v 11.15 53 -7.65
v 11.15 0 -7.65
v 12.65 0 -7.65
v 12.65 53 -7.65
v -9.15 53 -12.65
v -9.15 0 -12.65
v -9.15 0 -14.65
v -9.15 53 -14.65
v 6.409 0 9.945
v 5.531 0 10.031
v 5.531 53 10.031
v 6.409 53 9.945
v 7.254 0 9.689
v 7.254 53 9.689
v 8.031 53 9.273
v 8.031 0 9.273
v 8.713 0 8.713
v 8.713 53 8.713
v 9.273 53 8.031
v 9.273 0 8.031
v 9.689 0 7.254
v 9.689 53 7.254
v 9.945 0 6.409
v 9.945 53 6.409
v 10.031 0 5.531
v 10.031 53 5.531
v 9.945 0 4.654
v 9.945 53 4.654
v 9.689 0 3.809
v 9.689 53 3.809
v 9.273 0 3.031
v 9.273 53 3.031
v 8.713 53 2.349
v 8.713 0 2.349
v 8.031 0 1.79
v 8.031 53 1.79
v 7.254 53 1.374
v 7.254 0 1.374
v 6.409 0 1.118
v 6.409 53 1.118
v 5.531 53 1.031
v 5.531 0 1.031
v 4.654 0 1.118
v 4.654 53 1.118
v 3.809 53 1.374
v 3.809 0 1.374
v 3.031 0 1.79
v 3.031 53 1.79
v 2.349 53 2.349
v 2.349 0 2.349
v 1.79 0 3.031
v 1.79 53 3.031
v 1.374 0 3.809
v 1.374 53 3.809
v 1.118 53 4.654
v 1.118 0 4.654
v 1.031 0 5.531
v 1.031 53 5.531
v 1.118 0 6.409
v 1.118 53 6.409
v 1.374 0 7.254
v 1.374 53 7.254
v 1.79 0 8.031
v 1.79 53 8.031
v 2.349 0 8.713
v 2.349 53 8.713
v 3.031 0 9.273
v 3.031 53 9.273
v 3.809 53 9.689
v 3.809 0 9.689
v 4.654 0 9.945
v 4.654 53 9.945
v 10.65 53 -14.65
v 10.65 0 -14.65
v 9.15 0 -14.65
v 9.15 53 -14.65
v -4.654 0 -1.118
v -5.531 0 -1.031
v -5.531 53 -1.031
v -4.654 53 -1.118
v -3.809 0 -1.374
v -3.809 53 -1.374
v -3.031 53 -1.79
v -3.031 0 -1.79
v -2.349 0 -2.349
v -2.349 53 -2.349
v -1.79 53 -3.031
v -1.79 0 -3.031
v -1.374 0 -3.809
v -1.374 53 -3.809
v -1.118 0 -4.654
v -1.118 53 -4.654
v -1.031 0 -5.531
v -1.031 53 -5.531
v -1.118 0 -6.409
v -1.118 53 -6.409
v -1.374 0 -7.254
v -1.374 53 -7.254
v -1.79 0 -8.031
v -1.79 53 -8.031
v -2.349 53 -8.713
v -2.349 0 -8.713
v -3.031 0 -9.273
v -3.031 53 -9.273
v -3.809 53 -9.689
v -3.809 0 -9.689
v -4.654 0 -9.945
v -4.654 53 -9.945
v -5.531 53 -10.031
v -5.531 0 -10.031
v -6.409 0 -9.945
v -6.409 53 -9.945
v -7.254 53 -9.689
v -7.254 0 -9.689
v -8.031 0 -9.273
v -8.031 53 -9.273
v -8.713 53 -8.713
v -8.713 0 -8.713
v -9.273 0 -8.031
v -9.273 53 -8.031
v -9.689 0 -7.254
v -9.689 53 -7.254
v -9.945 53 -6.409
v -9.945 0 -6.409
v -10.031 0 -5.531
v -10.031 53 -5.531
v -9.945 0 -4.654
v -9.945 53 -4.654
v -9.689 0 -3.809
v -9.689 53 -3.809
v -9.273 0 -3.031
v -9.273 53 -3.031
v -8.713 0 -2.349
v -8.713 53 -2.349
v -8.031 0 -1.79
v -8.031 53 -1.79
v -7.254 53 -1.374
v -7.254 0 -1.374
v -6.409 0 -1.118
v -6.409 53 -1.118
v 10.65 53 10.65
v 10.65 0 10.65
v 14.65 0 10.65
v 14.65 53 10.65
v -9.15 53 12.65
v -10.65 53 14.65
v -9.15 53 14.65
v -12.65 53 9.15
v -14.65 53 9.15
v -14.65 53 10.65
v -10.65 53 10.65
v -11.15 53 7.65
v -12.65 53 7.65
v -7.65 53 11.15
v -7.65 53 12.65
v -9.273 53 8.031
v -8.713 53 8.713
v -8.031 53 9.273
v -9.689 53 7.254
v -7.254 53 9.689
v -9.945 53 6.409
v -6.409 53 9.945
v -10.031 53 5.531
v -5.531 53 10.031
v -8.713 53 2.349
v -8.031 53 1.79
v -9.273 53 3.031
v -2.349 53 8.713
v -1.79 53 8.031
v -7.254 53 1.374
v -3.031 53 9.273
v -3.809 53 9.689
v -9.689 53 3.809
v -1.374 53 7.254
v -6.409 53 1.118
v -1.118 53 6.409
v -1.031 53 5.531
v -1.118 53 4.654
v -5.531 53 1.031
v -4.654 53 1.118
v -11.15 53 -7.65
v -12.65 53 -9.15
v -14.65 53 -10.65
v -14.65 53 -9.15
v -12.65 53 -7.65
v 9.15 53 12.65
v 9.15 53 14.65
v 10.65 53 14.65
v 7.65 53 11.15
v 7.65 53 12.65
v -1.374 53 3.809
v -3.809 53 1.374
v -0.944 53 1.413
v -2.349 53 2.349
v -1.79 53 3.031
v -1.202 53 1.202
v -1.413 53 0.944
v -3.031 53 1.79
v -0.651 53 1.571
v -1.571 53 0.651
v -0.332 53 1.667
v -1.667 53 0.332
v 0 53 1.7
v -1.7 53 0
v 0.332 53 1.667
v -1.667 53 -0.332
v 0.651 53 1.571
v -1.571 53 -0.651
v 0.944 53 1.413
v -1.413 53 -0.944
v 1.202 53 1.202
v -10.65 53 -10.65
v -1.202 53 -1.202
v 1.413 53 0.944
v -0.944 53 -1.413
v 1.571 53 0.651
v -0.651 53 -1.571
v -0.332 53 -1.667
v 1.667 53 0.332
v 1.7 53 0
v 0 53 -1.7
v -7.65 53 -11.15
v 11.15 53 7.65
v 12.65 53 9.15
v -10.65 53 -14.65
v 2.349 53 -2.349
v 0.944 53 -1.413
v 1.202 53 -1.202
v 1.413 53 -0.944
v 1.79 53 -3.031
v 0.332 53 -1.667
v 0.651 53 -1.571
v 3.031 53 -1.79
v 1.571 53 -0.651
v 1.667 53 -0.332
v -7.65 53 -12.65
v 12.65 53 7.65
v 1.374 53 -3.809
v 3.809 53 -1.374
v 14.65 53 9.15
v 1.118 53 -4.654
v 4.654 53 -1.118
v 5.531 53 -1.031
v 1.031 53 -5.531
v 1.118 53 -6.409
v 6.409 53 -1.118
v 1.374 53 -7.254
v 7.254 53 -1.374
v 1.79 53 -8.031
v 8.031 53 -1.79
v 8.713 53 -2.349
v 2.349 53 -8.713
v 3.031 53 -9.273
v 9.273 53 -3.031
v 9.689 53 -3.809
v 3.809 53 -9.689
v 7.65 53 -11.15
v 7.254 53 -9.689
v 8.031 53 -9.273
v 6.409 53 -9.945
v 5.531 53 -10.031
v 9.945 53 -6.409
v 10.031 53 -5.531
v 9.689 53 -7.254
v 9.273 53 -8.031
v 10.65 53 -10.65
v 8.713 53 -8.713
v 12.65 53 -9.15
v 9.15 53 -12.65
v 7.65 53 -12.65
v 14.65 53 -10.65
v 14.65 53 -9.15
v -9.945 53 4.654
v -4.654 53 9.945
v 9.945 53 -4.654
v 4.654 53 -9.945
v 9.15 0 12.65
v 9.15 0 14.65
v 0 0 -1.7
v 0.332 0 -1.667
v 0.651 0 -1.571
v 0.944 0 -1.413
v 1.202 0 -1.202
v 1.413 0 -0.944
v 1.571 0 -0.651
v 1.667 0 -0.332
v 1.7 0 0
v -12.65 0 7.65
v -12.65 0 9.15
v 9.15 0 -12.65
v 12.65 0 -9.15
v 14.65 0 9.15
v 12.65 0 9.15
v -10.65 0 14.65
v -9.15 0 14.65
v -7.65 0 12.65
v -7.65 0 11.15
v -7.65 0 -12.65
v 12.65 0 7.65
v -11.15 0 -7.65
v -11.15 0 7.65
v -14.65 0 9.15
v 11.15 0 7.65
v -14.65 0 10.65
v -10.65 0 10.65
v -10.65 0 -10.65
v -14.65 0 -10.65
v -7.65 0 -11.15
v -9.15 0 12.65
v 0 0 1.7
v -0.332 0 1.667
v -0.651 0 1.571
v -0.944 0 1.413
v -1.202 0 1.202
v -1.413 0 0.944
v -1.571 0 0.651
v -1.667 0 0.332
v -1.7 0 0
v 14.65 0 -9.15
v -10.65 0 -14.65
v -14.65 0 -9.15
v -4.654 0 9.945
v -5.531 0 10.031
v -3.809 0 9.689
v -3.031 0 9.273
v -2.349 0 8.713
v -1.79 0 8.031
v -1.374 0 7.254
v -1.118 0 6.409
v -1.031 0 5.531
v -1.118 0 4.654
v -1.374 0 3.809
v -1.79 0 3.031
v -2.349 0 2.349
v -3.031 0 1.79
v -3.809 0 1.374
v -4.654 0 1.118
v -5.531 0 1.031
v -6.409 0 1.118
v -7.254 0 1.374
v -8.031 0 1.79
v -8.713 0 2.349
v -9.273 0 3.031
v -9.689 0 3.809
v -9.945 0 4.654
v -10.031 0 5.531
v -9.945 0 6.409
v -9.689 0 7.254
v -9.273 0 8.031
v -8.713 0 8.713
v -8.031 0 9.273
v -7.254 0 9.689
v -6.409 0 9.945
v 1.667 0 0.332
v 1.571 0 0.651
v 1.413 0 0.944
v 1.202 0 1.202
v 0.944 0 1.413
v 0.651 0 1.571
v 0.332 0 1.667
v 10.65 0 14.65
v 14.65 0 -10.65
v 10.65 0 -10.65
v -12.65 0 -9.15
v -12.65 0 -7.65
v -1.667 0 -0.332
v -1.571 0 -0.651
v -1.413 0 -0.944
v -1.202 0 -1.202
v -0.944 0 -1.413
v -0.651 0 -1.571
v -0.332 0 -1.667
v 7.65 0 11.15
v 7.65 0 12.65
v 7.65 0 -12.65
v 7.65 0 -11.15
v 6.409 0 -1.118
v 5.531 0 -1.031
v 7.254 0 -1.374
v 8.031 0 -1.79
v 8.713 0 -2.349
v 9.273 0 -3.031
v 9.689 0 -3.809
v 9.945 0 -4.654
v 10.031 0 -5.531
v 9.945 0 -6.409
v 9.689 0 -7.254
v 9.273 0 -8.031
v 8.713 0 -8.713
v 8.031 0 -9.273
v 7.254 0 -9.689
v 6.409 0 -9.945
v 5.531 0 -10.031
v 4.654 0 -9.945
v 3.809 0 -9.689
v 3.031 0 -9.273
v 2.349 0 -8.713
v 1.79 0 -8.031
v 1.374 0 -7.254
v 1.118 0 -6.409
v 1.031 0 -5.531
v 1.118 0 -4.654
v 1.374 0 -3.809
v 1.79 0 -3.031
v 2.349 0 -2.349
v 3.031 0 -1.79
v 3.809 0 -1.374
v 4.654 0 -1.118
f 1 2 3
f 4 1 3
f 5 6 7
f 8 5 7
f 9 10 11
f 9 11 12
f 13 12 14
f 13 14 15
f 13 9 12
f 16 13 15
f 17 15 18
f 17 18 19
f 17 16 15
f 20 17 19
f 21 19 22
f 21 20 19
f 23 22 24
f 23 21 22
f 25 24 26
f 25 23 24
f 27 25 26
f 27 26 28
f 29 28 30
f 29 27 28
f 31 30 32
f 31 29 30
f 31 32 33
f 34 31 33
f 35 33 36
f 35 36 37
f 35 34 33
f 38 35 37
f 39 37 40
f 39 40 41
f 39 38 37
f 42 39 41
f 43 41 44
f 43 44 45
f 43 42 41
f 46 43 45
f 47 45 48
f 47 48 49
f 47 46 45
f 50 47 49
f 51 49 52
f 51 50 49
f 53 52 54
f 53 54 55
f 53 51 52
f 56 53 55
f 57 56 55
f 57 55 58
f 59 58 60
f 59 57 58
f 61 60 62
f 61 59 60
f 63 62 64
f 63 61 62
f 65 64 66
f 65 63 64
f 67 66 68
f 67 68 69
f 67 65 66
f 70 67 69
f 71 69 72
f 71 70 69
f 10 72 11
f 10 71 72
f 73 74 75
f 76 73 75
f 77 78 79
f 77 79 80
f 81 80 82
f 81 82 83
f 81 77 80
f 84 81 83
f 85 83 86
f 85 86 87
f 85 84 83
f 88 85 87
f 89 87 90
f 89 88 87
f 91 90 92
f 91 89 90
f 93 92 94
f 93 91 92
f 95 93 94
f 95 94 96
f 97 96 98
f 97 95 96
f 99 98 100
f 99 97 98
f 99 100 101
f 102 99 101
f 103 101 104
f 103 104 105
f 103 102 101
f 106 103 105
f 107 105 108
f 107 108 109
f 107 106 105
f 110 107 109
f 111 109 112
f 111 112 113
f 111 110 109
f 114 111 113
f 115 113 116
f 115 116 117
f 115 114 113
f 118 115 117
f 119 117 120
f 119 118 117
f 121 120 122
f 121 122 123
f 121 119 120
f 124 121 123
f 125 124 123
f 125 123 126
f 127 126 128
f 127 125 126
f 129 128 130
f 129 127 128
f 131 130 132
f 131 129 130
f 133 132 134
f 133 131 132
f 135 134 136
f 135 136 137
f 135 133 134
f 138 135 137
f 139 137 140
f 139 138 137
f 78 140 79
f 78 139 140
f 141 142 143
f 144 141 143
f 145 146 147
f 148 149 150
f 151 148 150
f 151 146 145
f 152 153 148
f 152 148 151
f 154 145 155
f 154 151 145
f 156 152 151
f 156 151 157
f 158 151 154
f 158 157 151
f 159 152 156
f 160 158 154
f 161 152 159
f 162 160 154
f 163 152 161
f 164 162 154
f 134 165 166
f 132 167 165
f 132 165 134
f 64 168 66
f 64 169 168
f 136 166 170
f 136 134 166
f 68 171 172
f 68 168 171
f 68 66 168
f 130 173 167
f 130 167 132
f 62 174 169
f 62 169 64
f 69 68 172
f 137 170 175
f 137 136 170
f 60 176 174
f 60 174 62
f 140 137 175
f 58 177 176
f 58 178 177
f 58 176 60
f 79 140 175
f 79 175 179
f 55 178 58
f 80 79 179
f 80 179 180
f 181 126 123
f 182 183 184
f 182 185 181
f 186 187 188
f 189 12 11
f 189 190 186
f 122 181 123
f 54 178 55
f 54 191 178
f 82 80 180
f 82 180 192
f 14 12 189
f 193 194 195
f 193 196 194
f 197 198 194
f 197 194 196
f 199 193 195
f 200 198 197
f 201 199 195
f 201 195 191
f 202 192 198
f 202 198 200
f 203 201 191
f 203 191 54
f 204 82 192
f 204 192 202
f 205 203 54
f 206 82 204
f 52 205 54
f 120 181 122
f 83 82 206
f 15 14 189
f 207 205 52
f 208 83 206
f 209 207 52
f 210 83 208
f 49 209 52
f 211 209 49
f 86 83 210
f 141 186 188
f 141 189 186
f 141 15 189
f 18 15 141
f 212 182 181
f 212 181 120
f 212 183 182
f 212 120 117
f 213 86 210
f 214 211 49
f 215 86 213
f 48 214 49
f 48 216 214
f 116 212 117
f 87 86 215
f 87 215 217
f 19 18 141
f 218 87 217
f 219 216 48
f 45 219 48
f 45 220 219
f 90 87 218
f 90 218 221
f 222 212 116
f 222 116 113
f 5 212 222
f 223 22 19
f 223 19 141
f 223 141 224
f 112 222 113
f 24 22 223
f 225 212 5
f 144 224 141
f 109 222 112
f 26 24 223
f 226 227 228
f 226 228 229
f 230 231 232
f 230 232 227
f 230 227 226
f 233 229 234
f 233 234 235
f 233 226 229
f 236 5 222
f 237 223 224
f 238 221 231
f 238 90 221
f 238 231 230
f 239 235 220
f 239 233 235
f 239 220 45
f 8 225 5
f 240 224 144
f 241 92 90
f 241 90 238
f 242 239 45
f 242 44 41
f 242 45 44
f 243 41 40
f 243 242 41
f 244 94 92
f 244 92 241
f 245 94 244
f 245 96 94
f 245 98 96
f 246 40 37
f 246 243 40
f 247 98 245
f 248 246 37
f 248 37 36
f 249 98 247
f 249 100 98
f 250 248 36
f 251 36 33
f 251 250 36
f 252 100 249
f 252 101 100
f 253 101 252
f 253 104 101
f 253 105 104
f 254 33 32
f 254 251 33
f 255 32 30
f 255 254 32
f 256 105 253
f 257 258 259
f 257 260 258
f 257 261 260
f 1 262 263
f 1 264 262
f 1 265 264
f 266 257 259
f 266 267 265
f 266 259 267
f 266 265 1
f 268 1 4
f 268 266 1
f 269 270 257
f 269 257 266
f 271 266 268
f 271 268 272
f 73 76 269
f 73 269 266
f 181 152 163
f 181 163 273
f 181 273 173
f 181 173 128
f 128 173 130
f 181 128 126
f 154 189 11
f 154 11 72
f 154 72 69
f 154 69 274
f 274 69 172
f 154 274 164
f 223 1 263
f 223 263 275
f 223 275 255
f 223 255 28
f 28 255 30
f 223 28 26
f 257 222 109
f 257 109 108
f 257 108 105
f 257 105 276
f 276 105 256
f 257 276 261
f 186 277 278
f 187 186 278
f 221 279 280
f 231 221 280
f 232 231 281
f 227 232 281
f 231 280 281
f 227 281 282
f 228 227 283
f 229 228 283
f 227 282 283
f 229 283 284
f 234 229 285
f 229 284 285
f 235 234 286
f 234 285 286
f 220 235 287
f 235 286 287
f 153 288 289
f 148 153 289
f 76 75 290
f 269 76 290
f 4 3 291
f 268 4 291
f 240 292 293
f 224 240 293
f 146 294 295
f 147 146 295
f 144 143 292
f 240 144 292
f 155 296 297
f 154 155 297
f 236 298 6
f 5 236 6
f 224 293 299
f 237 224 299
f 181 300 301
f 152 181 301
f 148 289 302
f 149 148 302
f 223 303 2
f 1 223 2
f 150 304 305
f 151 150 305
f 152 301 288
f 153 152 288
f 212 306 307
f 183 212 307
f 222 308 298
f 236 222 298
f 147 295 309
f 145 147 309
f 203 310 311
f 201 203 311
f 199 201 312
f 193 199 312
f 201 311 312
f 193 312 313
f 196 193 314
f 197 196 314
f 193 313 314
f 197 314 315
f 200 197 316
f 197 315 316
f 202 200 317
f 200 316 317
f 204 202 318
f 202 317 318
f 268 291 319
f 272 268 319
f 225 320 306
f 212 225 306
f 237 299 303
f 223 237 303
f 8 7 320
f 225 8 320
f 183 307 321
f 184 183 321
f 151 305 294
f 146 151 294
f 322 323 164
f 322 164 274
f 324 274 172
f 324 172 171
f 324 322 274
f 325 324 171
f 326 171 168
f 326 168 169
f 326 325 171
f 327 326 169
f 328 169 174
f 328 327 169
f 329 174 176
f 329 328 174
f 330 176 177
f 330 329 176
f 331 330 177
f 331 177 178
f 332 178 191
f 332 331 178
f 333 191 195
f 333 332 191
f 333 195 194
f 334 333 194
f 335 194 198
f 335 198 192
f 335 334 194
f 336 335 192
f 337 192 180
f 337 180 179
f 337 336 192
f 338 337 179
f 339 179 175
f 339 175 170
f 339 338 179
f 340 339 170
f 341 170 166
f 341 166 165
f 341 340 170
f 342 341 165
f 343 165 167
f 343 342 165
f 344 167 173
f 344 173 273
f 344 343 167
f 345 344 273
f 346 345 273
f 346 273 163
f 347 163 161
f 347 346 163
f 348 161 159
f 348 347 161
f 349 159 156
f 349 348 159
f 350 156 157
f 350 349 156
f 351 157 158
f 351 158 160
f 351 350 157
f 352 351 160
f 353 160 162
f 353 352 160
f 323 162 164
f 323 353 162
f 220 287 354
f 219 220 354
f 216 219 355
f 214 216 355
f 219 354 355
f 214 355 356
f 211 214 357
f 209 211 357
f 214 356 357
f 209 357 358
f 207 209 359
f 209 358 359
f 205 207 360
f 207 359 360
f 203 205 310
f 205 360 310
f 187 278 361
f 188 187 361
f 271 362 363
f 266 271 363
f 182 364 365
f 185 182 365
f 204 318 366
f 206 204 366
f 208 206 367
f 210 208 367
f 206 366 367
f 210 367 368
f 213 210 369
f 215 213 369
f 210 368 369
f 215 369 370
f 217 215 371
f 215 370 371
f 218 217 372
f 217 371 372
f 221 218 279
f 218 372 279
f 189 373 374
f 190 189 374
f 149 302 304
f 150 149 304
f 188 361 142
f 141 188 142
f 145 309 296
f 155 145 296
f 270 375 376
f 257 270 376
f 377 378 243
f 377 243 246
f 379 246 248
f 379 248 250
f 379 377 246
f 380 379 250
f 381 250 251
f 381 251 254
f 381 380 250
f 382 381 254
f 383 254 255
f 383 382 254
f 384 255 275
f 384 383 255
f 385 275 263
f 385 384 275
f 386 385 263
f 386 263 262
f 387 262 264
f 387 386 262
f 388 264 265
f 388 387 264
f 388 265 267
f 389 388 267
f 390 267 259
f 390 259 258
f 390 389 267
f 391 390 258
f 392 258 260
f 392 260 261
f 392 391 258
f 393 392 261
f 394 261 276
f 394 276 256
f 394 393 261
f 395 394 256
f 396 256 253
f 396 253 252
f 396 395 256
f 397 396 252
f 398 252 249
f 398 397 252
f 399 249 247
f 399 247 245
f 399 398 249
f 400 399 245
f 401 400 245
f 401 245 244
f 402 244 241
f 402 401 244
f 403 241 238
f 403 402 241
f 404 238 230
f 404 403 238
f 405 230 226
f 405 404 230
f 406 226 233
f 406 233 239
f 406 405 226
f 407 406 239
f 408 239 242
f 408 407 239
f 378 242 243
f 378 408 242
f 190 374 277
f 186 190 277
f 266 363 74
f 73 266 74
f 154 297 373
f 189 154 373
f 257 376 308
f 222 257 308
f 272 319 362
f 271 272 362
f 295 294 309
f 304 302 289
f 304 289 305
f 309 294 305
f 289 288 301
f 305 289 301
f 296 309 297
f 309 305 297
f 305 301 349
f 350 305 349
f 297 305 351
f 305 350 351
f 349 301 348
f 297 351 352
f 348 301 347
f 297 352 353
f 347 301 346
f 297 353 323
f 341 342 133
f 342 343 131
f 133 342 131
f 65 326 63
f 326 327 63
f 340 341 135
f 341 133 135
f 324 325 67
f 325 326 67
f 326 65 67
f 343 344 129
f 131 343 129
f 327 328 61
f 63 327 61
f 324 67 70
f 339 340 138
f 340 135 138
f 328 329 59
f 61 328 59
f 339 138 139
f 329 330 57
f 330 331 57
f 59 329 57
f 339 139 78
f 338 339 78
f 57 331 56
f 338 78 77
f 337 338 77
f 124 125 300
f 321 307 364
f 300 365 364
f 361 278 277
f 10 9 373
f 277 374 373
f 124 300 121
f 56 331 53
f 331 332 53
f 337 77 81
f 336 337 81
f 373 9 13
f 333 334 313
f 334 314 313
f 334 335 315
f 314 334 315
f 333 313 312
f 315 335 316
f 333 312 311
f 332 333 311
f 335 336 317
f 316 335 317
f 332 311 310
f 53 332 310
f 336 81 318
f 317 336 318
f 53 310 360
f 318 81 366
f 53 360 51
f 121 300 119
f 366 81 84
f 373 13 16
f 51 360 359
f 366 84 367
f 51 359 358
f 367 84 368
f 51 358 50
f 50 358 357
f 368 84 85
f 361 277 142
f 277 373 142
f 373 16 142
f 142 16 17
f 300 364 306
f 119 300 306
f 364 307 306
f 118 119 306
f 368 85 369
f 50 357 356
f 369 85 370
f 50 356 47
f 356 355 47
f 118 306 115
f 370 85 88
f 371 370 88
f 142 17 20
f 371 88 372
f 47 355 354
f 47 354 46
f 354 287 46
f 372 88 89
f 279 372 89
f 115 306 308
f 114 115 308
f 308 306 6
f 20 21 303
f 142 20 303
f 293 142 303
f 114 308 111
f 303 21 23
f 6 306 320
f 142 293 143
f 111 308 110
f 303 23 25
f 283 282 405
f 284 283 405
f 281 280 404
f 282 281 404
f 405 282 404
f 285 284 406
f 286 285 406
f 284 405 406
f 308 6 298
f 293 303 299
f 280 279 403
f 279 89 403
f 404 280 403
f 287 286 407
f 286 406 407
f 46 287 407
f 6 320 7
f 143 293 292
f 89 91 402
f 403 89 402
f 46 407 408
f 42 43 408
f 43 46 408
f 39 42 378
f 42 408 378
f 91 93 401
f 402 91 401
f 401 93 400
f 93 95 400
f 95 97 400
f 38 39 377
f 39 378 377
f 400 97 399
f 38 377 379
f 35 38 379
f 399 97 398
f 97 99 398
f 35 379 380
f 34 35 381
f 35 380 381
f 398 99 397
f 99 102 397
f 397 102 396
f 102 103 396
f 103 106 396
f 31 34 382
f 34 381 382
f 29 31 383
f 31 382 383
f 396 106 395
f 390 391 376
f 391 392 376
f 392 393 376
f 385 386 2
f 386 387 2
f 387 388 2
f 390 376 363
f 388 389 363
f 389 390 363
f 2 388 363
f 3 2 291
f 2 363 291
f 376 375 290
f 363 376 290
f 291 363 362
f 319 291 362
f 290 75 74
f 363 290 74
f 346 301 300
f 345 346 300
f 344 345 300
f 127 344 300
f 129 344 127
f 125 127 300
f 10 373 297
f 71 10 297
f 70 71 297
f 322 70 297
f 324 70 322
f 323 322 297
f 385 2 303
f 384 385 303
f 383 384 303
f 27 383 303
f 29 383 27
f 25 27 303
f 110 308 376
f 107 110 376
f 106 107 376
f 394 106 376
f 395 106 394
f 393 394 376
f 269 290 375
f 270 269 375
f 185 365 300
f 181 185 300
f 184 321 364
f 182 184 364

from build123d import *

# Parameters (mm, degrees)
SKETCH1_R           = 4.5
BOSS_EXTRUDE1_DEPTH = 53


with BuildPart() as part:
    # Sketch1 → Boss-Extrude1 (new body)
    with BuildSketch(Plane(origin=(0, 0, 0), x_dir=(1, 0, 0), z_dir=(0, 1, 0))):
        Polygon((-9.15, 14.65), (-10.65, 14.65), (-10.65, 10.65), (-14.65, 10.65), (-14.65, 9.15), (-12.65, 9.15), (-12.65, 7.65), (-11.15, 7.65), (-11.15, 0), (-11.15, -7.65), (-12.65, -7.65), (-12.65, -9.15), (-14.65, -9.15), (-14.65, -10.65), (-10.65, -10.65), (-10.65, -14.65), (-9.15, -14.65), (-9.15, -12.65), (-7.65, -12.65), (-7.65, -11.15), (0, -11.15), (7.65, -11.15), (7.65, -12.65), (9.15, -12.65), (9.15, -14.65), (10.65, -14.65), (10.65, -10.65), (14.65, -10.65), (14.65, -9.15), (12.65, -9.15), (12.65, -7.65), (11.15, -7.65), (11.15, 0), (11.15, 7.65), (12.65, 7.65), (12.65, 9.15), (14.65, 9.15), (14.65, 10.65), (10.65, 10.65), (10.65, 14.65), (9.15, 14.65), (9.15, 12.65), (7.65, 12.65), (7.65, 11.15), (0, 11.15), (-7.65, 11.15), (-7.65, 12.65), (-9.15, 12.65), align=None)
        with Locations((-5.531430712, -5.531430712)):
            Circle(SKETCH1_R, mode=Mode.SUBTRACT)
        with Locations((5.531430712, -5.531430712)):
            Circle(SKETCH1_R, mode=Mode.SUBTRACT)
        with Locations((-5.531430712, 5.531430712)):
            Circle(SKETCH1_R, mode=Mode.SUBTRACT)
        with BuildLine():
            ThreePointArc((0, -1.7), (-1.202081528, -1.202081528), (-1.7, 0))
            ThreePointArc((-1.7, 0), (-1.202081528, 1.202081528), (0, 1.7))
            ThreePointArc((0, 1.7), (1.202081528, 1.202081528), (1.7, 0))
            ThreePointArc((1.7, 0), (1.202081528, -1.202081528), (0, -1.7))
        make_face(mode=Mode.SUBTRACT)
        with Locations((5.531430712, 5.531430712)):
            Circle(SKETCH1_R, mode=Mode.SUBTRACT)
    extrude(amount=BOSS_EXTRUDE1_DEPTH)


solid = part.part
